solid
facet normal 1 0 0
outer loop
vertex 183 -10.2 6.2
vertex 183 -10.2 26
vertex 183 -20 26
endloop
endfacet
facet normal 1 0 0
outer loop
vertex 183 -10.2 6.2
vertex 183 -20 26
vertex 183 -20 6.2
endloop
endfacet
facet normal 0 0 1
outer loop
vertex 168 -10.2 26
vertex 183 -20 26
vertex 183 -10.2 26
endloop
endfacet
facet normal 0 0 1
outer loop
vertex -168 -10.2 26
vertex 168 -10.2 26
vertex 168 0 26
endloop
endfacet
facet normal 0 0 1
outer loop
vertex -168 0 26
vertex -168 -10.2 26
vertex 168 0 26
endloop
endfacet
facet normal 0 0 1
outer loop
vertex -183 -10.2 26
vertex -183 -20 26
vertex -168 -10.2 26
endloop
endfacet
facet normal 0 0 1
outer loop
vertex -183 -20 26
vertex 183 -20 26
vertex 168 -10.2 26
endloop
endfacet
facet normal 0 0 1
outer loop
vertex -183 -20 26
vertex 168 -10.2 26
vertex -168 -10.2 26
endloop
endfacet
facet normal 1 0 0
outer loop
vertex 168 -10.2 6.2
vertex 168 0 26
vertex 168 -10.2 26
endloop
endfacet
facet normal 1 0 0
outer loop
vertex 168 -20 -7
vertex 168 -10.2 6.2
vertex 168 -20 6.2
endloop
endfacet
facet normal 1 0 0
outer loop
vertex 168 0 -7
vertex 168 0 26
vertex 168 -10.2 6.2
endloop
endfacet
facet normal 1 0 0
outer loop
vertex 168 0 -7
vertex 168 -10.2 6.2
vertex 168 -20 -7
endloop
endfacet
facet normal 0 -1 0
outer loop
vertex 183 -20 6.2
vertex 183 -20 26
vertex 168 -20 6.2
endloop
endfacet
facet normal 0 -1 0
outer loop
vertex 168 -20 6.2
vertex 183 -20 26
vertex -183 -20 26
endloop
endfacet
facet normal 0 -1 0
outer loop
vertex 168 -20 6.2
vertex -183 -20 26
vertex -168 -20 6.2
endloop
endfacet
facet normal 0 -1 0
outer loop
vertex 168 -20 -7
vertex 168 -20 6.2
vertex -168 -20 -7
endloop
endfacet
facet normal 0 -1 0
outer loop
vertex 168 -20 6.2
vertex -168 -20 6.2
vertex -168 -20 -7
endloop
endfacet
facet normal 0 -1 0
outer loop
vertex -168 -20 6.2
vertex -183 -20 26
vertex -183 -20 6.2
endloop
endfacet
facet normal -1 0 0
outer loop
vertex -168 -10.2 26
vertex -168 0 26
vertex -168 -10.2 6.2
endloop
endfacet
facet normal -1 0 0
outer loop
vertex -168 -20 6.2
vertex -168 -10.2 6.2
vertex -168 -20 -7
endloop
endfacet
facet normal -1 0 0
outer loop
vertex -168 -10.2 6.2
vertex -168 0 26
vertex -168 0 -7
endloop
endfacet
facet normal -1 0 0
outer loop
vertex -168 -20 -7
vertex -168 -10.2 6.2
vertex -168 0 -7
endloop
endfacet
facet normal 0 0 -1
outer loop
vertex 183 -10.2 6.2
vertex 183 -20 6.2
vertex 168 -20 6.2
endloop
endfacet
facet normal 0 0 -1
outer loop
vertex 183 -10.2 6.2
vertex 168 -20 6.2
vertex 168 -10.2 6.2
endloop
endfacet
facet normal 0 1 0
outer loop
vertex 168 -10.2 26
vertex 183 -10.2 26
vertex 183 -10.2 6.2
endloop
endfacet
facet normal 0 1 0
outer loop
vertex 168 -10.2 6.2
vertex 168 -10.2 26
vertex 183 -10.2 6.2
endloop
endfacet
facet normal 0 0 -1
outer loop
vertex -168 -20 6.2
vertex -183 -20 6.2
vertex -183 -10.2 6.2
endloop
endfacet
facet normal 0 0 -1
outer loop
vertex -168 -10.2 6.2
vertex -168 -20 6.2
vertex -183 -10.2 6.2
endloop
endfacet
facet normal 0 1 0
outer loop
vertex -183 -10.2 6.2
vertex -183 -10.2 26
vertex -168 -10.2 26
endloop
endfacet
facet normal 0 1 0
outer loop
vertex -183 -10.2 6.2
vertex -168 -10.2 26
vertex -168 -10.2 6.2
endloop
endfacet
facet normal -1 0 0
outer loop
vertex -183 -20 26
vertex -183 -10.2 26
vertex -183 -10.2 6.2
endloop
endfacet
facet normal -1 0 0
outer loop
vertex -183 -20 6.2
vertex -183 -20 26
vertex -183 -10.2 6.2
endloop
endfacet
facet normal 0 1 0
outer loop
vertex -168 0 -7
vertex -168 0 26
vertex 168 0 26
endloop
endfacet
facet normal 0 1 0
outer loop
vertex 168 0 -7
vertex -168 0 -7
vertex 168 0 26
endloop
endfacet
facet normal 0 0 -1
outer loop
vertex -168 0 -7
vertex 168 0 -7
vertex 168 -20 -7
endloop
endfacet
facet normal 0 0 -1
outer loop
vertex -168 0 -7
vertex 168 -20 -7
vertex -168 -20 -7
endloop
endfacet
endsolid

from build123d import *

# Parameters (mm, degrees)
EXTRUDE_1_DEPTH        = 26
EXTRUDE_2_DEPTH        = 19
FILLET_1_R             = 10
SKETCH_1_5_W           = 11
SKETCH_1_5_H           = 340
EXTRUDE_4_DEPTH        = 7
SKETCH_6_W             = 1.9
SKETCH_6_H             = 2
SKETCH_6_W_2           = 6.6
EXTRUDE_5_DEPTH        = 28
SKETCH_6_3_W           = 6.6
SKETCH_6_3_H           = 2
CUT_EXTRUDE_2_DEPTH    = 5
FILLET_2_R             = 20
SKETCH_6_4_W           = 15
SKETCH_6_4_H           = 10
SKETCH_6_4_H_2         = 9
EXTRUDE_6_DEPTH        = 30
SKETCH_6_5_W           = 15
SKETCH_6_5_H           = 9
EXTRUDE_7_DEPTH        = 28
EXTRUDE_8_DEPTH        = 15
FILLET_3_R             = 20
FILLET_3_OF_MIRROR_2_R = 20
FILLET_4_R             = 20
SKETCH_10_W            = 161
SKETCH_10_H            = 20
SKETCH_10_W_2          = 14
EXTRUDE_9_DEPTH        = 7
SKETCH_12_W            = 33
SKETCH_12_H            = 20
CUT_EXTRUDE_3_DEPTH    = 42
SKETCH_11_W            = 19.8
SKETCH_11_H            = 9.8
EXTRUDE_10_DEPTH       = 15


with BuildPart() as part:
    # 스케치1 → 보스-돌출1 (new body)
    with BuildSketch(Plane.XY):
        Polygon((-168, 0), (168, 0), (183, 0), (183, -340), (168, -340), (168, -20), (-168, -20), (-168, -340), (-183, -340), (-183, 0), align=None)
    extrude(amount=EXTRUDE_1_DEPTH)

    # 스케치1<4> → 보스-돌출2 (add)
    with BuildSketch(Plane.XY):
        Polygon((172, 0), (168, 0), (168, -20), (168, -340), (172, -340), align=None)
        Polygon((-168, -20), (-168, 0), (-172, 0), (-172, -340), (-168, -340), align=None)
    extrude(amount=-EXTRUDE_2_DEPTH)

    # 필렛1
    fillet_1_edges = [part.edges().sort_by_distance(p)[0] for p in [
        (170, 0, -19),
        (170, -340, -19),
        (-170, -340, -19),
        (-170, 0, -19),
    ]]
    fillet(fillet_1_edges, radius=FILLET_1_R)

    # 스케치1<5> → 보스-돌출4 (add)
    with BuildSketch(Plane.XY):
        with Locations((177.5, -170)):
            Rectangle(SKETCH_1_5_W, SKETCH_1_5_H)
        with Locations((-177.5, -170)):
            Rectangle(SKETCH_1_5_W, SKETCH_1_5_H)
    extrude(amount=-EXTRUDE_4_DEPTH)

    # 스케치6 → 보스-돌출5 (add)
    with BuildSketch(Plane.XZ.offset(340)):
        with Locations((-182.05, -6)):
            Rectangle(SKETCH_6_W, SKETCH_6_H)
        with Locations((-177.8, -6)):
            Rectangle(SKETCH_6_W_2, SKETCH_6_H)
        Polygon((-174.5, -7), (-172, -7), (-168, -7), (-168, -5), (-174.5, -5), align=None)
    extrude_5 = extrude(amount=EXTRUDE_5_DEPTH)

    # 스케치6<3> → 컷-돌출2 (cut)
    with BuildSketch(Plane.XZ.offset(340)):
        with Locations((-177.8, -6)):
            Rectangle(SKETCH_6_3_W, SKETCH_6_3_H)
    cut_extrude_2 = extrude(amount=CUT_EXTRUDE_2_DEPTH, mode=Mode.SUBTRACT)

    # 필렛2
    # the kernel refuses this fillet: 20 mm, written as the material it adds along each edge
    with BuildSketch(Plane(origin=(-172, -340, -7), x_dir=(0, -1, 0), z_dir=(1, 0, 0))) as fillet_2_piece_1:
        with BuildLine():
            CenterArc((14, 20), FILLET_2_R, 216.869897646, 53.130102354)
            Line((-2, 8), (-3.6, 6.8))
            ThreePointArc((-3.6, 6.8), (-2, 2), (-2, 0))
            Line((-2, 0), (0, -2))
            Line((0, -2), (14, -2))
            Line((14, -2), (14, 0))
        make_face()
    extrude(amount=4)

    # 스케치6<4> → 보스-돌출6 (add)
    with BuildSketch(Plane.XZ.offset(340)):
        with Locations((-175.5, 31)):
            Rectangle(SKETCH_6_4_W, SKETCH_6_4_H)
        with Locations((-175.5, 40.5)):
            Rectangle(SKETCH_6_4_W, SKETCH_6_4_H_2)
    extrude_6 = extrude(amount=-EXTRUDE_6_DEPTH)

    # 스케치6<5> → 보스-돌출7 (add)
    with BuildSketch(Plane.XZ.offset(340)):
        with Locations((-175.5, 40.5)):
            Rectangle(SKETCH_6_5_W, SKETCH_6_5_H)
    extrude_7 = extrude(amount=EXTRUDE_7_DEPTH)

    # 스케치9 → 보스-돌출8 (add)
    with BuildSketch(Plane.ZY.offset(183)):
        Polygon((26, -310), (45, -310), (26, -270), align=None)
    extrude_8 = extrude(amount=-EXTRUDE_8_DEPTH)

    # 필렛3
    fillet_3_edges = [part.edges().sort_by_distance(p)[0] for p in [
        (-175.5, -310, 45),
        (-175.5, -270, 26),
    ]]
    fillet(fillet_3_edges, radius=FILLET_3_R)

    # 대칭 복사2: 보스-돌출5, 컷-돌출2, 보스-돌출6, 보스-돌출7, 보스-돌출8 across plane
    add(extrude_5.mirror(Plane(origin=(0, 0, 0), x_dir=(0, 0, 1), z_dir=(1, 0, 0))))
    add(cut_extrude_2.mirror(Plane(origin=(0, 0, 0), x_dir=(0, 0, 1), z_dir=(1, 0, 0))), mode=Mode.SUBTRACT)
    add(extrude_6.mirror(Plane(origin=(0, 0, 0), x_dir=(0, 0, 1), z_dir=(1, 0, 0))))
    add(extrude_7.mirror(Plane(origin=(0, 0, 0), x_dir=(0, 0, 1), z_dir=(1, 0, 0))))
    add(extrude_8.mirror(Plane(origin=(0, 0, 0), x_dir=(0, 0, 1), z_dir=(1, 0, 0))))

    # 필렛3 of 대칭 복사2
    fillet_3_of_mirror_2_edges = [part.edges().sort_by_distance(p)[0] for p in [
        (175.5, -310, 45),
        (175.5, -270, 26),
    ]]
    fillet(fillet_3_of_mirror_2_edges, radius=FILLET_3_OF_MIRROR_2_R)

    # 필렛4
    # the kernel refuses this fillet: 20 mm, written as the material it adds along each edge
    with BuildSketch(Plane(origin=(172, -340, -7), x_dir=(0, -1, 0), z_dir=(-1, 0, 0))) as fillet_4_piece_1:
        with BuildLine():
            CenterArc((14, -20), FILLET_4_R, 90, 53.130102354)
            Line((-2, -8), (-3.6, -6.8))
            ThreePointArc((-3.6, -6.8), (-2, -2), (-2, 0))
            Line((-2, 0), (0, 2))
            Line((0, 2), (14, 2))
            Line((14, 2), (14, 0))
        make_face()
    extrude(amount=4)

    # 스케치10 → 보스-돌출9 (add)
    with BuildSketch(Plane(origin=(0, 0, 0), x_dir=(-1, 0, 0), z_dir=(0, 0, -1))):
        with Locations((87.5, -10)):
            Rectangle(SKETCH_10_W, SKETCH_10_H)
        with Locations((-87.5, -10)):
            Rectangle(SKETCH_10_W, SKETCH_10_H)
        with Locations((0, -10)):
            Rectangle(SKETCH_10_W_2, SKETCH_10_H)
    extrude(amount=EXTRUDE_9_DEPTH)

    # 스케치12 → 컷-돌출3 (cut)
    with BuildSketch(Plane(origin=(-168, 0, 0), x_dir=(0, 0, -1), z_dir=(1, 0, 0))):
        with BuildLine():
            ThreePointArc((-43.065550087, -305.927473868), (-44.510394688, -310.110371974), (-45, -314.508610159))
            Line((-45, -314.508610159), (-45, -368))
            Line((-45, -368), (-36, -368))
            Line((-36, -368), (-36, -340))
            Line((-36, -340), (5, -340))
            Line((5, -340), (5, -368))
            Line((5, -368), (7, -368))
            Line((7, -368), (7, -354))
            Line((7, -354), (7, -20))
            Line((7, -20), (-26, -20))
            Line((-26, -20), (-26, -265.491389841))
            ThreePointArc((-26, -265.491389841), (-26.489605312, -269.889628026), (-27.934449913, -274.072526132))
            Line((-27.934449913, -274.072526132), (-43.065550087, -305.927473868))
        make_face()
        with Locations((-9.5, -10)):
            Rectangle(SKETCH_12_W, SKETCH_12_H)
        with BuildLine():
            Line((7, 0), (7, -20))
            Line((7, -20), (7, -354))
            ThreePointArc((7, -354), (9.11145618, -345.05572809), (15, -338))
            ThreePointArc((15, -338), (17.94427191, -334.472135955), (19, -330))
            Line((19, -330), (19, -10))
            ThreePointArc((19, -10), (16.071067812, -2.928932188), (9, 0))
            Line((9, 0), (7, 0))
        make_face()
    cut_extrude_3 = extrude(amount=-CUT_EXTRUDE_3_DEPTH, mode=Mode.SUBTRACT)

    # 대칭 복사3: 컷-돌출3 across plane
    add(cut_extrude_3.mirror(Plane(origin=(0, 0, 0), x_dir=(0, 0, 1), z_dir=(1, 0, 0))), mode=Mode.SUBTRACT)

    # 스케치11 → 보스-돌출10 (add)
    with BuildSketch(Plane(origin=(183, 0, 0), x_dir=(0, 0, -1), z_dir=(1, 0, 0))):
        with Locations((-16.1, -15.1)):
            Rectangle(SKETCH_11_W, SKETCH_11_H)
    extrude_10 = extrude(amount=-EXTRUDE_10_DEPTH)

    # 대칭 복사4: 보스-돌출10 across plane
    add(extrude_10.mirror(Plane(origin=(0, 0, 0), x_dir=(0, 0, 1), z_dir=(1, 0, 0))))


solid = part.part
